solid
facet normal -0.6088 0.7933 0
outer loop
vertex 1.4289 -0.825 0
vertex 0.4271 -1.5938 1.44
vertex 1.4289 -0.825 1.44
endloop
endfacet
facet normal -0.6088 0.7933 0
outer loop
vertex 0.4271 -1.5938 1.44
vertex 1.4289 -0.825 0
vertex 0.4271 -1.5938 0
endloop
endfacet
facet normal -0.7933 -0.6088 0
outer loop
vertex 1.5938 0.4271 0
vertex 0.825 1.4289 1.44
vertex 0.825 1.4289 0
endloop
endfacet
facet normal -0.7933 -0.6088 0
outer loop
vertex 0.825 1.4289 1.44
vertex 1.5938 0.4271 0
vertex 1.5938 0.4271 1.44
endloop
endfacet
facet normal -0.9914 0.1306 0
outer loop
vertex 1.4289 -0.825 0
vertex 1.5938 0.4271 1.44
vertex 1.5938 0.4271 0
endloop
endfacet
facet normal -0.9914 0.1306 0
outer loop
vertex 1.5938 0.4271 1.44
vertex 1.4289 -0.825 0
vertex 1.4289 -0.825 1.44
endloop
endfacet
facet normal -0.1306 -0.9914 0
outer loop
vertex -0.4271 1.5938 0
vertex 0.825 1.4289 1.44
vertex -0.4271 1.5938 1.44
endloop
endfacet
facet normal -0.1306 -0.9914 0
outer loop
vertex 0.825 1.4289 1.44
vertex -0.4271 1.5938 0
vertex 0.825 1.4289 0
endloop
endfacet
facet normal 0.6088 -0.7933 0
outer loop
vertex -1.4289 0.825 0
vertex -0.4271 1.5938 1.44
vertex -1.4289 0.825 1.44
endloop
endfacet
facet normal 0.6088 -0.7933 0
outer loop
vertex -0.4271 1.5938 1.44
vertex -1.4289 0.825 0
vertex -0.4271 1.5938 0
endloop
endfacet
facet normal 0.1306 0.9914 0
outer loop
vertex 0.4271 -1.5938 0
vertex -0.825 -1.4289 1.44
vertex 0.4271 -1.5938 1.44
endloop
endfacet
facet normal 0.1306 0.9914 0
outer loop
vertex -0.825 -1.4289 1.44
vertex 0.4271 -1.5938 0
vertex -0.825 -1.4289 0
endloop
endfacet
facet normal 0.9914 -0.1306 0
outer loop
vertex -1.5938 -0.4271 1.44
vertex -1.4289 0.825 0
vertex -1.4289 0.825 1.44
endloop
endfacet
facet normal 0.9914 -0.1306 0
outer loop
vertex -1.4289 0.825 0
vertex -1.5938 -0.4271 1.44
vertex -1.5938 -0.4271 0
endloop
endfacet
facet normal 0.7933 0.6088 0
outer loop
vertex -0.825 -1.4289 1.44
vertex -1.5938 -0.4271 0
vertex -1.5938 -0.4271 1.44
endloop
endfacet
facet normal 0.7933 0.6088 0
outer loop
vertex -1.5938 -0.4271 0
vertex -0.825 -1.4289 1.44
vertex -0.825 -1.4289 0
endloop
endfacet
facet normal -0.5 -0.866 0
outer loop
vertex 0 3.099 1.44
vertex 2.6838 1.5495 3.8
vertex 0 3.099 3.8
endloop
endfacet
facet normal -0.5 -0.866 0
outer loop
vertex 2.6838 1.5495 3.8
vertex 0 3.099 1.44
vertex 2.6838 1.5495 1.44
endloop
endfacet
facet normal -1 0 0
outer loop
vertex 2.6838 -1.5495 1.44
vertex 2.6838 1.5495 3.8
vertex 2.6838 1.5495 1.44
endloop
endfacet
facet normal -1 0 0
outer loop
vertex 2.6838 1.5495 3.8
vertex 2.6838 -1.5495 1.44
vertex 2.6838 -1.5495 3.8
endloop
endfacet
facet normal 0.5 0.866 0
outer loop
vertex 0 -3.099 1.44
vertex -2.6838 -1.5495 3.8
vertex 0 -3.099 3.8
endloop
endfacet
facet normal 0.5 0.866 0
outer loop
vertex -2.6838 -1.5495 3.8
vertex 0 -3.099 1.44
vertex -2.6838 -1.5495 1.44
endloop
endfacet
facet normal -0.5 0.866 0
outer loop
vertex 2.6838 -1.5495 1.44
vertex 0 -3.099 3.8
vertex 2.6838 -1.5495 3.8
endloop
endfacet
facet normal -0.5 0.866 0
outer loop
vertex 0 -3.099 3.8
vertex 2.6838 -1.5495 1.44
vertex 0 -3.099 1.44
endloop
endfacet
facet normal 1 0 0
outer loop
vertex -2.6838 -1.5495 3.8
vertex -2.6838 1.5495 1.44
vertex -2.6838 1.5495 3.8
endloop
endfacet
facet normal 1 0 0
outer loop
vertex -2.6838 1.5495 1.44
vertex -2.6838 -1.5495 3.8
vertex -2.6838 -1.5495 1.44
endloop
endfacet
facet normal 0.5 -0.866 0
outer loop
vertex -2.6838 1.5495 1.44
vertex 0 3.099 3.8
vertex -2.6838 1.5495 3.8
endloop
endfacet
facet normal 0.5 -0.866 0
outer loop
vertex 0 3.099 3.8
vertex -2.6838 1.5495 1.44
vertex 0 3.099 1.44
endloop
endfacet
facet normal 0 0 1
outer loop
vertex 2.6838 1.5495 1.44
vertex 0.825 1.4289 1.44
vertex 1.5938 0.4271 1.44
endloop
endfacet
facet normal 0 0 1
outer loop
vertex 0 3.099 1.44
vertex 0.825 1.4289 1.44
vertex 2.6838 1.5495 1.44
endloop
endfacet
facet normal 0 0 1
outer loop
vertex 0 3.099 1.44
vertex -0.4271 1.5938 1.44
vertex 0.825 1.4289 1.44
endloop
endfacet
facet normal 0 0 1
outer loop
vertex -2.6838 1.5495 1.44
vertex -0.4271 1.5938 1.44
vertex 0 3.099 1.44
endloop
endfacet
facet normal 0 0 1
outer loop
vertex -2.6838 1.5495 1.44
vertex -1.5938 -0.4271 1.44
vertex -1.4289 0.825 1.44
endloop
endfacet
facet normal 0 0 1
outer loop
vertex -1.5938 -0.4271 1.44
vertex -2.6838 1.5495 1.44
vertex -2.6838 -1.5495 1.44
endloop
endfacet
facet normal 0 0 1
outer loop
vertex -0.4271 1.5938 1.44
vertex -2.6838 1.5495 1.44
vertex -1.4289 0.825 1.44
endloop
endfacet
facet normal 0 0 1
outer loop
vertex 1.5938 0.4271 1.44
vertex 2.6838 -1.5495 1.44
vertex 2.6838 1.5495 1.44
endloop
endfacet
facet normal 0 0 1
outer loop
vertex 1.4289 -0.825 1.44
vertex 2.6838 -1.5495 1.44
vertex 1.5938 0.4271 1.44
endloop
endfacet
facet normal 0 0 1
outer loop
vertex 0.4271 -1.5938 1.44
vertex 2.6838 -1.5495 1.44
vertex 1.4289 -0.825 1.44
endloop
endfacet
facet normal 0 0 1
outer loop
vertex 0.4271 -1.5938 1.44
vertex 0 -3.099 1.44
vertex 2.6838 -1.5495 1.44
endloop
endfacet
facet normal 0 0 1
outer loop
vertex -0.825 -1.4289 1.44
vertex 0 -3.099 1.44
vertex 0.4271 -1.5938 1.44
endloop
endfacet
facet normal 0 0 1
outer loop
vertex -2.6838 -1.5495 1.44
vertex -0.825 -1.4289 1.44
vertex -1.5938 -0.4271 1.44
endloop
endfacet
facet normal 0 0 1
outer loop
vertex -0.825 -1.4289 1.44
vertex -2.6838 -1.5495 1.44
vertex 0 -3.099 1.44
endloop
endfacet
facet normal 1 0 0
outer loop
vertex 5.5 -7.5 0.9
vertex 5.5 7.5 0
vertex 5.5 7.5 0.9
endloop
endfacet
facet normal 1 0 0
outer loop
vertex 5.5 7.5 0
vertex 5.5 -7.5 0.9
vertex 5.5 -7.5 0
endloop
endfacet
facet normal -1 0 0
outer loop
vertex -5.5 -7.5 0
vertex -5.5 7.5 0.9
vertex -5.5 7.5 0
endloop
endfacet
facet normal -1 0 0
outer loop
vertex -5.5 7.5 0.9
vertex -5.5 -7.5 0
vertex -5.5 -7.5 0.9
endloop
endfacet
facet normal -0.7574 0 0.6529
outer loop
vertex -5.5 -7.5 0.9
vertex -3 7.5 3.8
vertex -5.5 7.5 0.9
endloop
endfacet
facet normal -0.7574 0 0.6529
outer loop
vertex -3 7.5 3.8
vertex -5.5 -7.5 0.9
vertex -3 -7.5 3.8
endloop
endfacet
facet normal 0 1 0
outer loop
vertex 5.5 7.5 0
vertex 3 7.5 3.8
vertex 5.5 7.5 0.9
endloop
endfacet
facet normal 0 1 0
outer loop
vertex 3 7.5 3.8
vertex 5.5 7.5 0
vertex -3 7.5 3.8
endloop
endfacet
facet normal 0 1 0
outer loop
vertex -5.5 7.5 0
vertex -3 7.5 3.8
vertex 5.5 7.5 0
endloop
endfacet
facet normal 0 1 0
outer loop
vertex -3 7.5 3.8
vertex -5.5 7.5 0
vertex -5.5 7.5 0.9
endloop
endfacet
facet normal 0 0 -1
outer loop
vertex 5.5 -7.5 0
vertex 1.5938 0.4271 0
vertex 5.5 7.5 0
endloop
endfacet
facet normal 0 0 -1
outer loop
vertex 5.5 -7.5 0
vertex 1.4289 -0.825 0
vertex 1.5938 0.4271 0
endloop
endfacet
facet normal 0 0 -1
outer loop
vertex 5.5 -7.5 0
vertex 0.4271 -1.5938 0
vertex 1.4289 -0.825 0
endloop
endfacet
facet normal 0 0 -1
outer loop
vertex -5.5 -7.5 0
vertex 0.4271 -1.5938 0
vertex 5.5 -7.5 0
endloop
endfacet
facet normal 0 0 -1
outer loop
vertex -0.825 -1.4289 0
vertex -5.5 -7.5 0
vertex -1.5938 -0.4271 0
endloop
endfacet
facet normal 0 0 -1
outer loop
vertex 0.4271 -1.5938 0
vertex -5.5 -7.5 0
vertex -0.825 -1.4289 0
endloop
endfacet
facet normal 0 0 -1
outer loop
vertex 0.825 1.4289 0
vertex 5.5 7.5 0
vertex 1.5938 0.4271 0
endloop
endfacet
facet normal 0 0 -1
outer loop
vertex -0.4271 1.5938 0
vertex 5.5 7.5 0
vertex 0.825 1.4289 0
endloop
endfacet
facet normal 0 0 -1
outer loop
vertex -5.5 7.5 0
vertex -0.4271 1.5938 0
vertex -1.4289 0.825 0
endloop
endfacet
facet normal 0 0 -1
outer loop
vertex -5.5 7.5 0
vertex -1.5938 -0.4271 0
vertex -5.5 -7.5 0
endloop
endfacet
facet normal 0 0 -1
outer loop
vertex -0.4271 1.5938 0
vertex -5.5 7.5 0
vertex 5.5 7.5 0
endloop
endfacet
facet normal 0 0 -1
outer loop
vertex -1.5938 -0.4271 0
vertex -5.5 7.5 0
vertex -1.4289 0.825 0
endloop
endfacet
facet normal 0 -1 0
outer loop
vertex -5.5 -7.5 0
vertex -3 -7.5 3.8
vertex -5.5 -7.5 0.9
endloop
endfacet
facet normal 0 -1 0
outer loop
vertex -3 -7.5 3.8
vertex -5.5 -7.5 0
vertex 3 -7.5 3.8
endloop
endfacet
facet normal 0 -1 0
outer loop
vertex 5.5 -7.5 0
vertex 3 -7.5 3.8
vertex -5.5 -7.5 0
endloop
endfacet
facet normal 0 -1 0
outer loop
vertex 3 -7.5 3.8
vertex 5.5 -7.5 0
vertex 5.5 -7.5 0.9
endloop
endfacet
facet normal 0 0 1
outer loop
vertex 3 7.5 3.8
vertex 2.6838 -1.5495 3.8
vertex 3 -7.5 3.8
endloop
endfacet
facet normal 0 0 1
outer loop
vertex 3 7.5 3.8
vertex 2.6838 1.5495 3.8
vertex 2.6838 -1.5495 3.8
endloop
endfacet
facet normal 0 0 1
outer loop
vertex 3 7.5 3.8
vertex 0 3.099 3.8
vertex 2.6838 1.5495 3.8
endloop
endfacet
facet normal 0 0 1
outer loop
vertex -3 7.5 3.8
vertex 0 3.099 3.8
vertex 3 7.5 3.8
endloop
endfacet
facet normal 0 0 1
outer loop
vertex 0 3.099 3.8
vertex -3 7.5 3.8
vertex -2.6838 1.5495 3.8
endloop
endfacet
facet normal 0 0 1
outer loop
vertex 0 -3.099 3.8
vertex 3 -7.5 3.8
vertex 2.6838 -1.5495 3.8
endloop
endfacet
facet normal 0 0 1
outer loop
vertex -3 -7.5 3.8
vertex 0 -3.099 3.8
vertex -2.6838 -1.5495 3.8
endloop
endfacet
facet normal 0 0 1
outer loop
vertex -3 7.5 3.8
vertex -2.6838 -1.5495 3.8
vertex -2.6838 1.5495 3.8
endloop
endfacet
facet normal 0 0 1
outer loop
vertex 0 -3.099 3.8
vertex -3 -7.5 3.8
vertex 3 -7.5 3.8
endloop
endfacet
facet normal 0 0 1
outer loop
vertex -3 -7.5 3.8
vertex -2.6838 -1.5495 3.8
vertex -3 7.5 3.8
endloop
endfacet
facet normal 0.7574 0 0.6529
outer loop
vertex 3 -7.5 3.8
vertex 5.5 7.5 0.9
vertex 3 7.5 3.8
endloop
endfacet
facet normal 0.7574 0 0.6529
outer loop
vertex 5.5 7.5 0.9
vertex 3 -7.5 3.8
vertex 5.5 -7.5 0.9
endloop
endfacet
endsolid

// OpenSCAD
// file: beam.scad
// Misumi Beam
module misumibeam(size1=15, size2=15, length=100, extra=0.1) {
   difference() {
      cube([size1+extra, size2+extra, length], center=true);
      for (a = [0:180:180]) rotate([0, 0, a]) {
         translate([size1/2, 0, 0]) {
          //  % cube([size1/2, 3, length+1], center=true);
			minkowski() {
               cube([size1/2-(extra+1), size1/6-extra, length+1], center=true);
               cylinder(r=0.5, h=1, center=true);
			} 
        }
      }
      for (a = [0:90:270]) rotate([0, 0, a]) {
         translate([size2/2, 0, 0]) {
          //  % cube([size1/2, 3, length+1], center=true);
			minkowski() {
               cube([size1/2-(extra+1), size1/6-extra, length+1], center=true);
               cylinder(r=0.5, h=1, center=true);
			} 
        }
      }
   }
}

# misumibeam(15, 15, 300);
// file: nema17.scad
include <configuration.scad>;

// NEMA17 stepper motor

module stepper_motor(length=47.5, shaft_radius=5.00/2) {
   intersection() {
      cube([42.2, length, 42.2], center=true);
      rotate([90, 0, 0])
      cylinder(r=25.5, h=length+1, center=true);
   }
   translate([0, -length/2, 0]) {
// drive shaft
		rotate([90, 0, 0]) {
		 cylinder(r1=11, r2=11, h=2, $fn=40);
		 cylinder(r=shaft_radius, h=25);
		}
// mounting bolts
      for (a = [0:90:360]) rotate([0, a, 0]) {
         translate([15.5, 0, 15.5]) rotate([90, 0, 0])
         cylinder(r=m3_major_radius, h=10,  $fn=30);
      }
   }
}

module stepper_motor_boolean(length=47.5, shaft_radius=7.00/2) {
   intersection() {
      cube([42.2, length, 42.2], center=true);
      rotate([90, 0, 0])
      cylinder(r=25.5, h=length+1, center=true);
   }
   translate([0, -length/2, 0]) {
// drive shaft
		rotate([90, 0, 0]) {
		 cylinder(r1=12+extra_boolean, r2=11+extra_boolean, h=2, $fn=40);
		 cylinder(r=shaft_radius, h=25, $fn=8);
		}
// mounting bolts
      for (a = [0:90:360]) rotate([0, a, 0]) {
         translate([15.5, 0, 15.5]) rotate([90, 0, 0])
         cylinder(r=m3_major_radius+extra_radius, h=10,  $fn=8);
      }
   }
}

//# stepper_motor();
# stepper_motor_boolean();
// file: metric_fastners.scad
/*
 *  OpenSCAD Metric Fastners Library (www.openscad.org)
 *  Copyright (C) 2010-2011  Giles Bathgate
 *
 *  This program is free software; you can redistribute it and/or modify
 *  it under the terms of the GNU General Public License as published by
 *  the Free Software Foundation; either version 3 of the License,
 *  LGPL version 2.1, or (at your option) any later version of the GPL.
 *
 *  This program is distributed in the hope that it will be useful,
 *  but WITHOUT ANY WARRANTY; without even the implied warranty of
 *  MERCHANTABILITY or FITNESS FOR A PARTICULAR PURPOSE.  See the
 *  GNU General Public License for more details.
 *
 *  You should have received a copy of the GNU General Public License
 *  along with this program; if not, write to the Free Software
 *  Foundation, Inc., 59 Temple Place, Suite 330, Boston, MA 02111-1307 USA
 *
*/

$fn=50;
apply_chamfer=false;

// M3 Mesurements
m3_minor_radius = 2.50/2;
m3_major_radius = 3.00/2;
m3_head_radius = 5.50/2;
m3_nut_radius = 6.20/2;

// M4 Mesurements
m4_minor_radius = 3.30/2;
m4_major_radius = 4.00/2;
m4_head_radius = 7.00/2;
m4_nut_radius = 8.26/2;

// M5 Mesurements
m5_minor_radius = 4.20/2;
m5_major_radius = 5.00/2;
m5_head_radius = 8.50/2;
m5_nut_radius = 10.33/2;

// M6 Mesurements
m6_minor_radius = 5.00/2;
m6_major_radius = 6.00/2;
m6_head_radius = 10.00/2;
m6_nut_radius = 12.40/2;


module cap_bolt(dia,len)
{
	e=1.5*dia;
	h1=1.25*dia;
	cylinder(r=dia/2,h=len);
	translate([0,0,-h1]) cylinder(r=e/2,h=h1);
}

module cap_bolt_boolean(dia,len,fn=8)
{
	e=1.87*dia;
	h1=2*dia;
	cylinder(r=dia/2,h=len,$fn=fn);
	translate([0,0,-h1+0.05]) cylinder(r2=e/2+0.15,r1=e/2+0.3,h=h1,$fn=fn);
}

module csk_bolt(dia,len)
{
	h1=0.6*dia;
	h2=len-h1;
	cylinder(r=dia/2,h=h2);
	cylinder(r1=dia,r2=dia/2,h=h1);
}

module washer(dia)
{
	t=0.1*dia;
	difference()
	{
		cylinder(r=dia,h=t);
		translate([0,0,-t/2])cylinder(r=dia/2,h=t*2);
	}
}

module flat_nut(dia)
{
	m=0.8*dia;
	e=2.066*dia;
	c=0.2*dia;
	difference()
	{
		cylinder(r=e/2,h=m,$fn=6);
		translate([0,0,-m/2])cylinder(r=dia/2,h=m*2);
		if(apply_chamfer)
		    translate([0,0,c])cylinder_chamfer(e/2,c);
	}
}

module flat_nut_boolean(dia)
{
	m=0.8*dia;
	e=2.066*dia;
	c=0.2*dia;
	difference()
	{
		cylinder(r=e/2,h=m,$fn=6);
		if(apply_chamfer)
		    translate([0,0,c])cylinder_chamfer(e/2,c);
	}
}

module bolt(dia,len)
{
	e=1.8*dia;
	k=0.7*dia;
	c=0.2*dia;
	difference()
	{
		cylinder(r=e/2,h=k,$fn=6);
		if(apply_chamfer)
		    translate([0,0,c])cylinder_chamfer(e/2,c);
	}

	cylinder(r=dia/2,h=len);

}

module cylinder_chamfer(r1,r2)
{
	t=r1-r2;
	p=r2*2;
	rotate_extrude()
	difference()
	{
		translate([t,-p])square([p,p]);
		translate([t,0])circle(r2);
	}
}

module chamfer(len,r)
{
	p=r*2;
	linear_extrude(height=len)
	difference()
	{
		square([p,p]);
		circle(r);
	}
}

union()
{
//cap_bolt(3,15);
//cap_bolt_boolean(3,15,30);
//csk_bolt(3,14);
//washer(3);
//flat_nut_boolean(3);
//bolt(4,14);
//cylinder_chamfer(8,1);
//chamfer(10,2);
}
// file: configuration.scad
// Delta-Six 3D Printer 
// Created by Sage Merrill
// Released on Openbuilds.com
// Based on orginal design by Johann C. Rocholl (Kossel Printer)
// License = Attribution Share Alike - CC BY SA


include <metric_fastners.scad>;
use <nema17.scad>;
use <beam.scad>;
use <timing_belts.scad>;

$fn=20;

// Increase this if your slicer or printer makes the holes too small.
extra_radius = 0.10;
extra_boolean = 0.15;

// Delta Parameters
global_delta_arm_seperation = 55;
global_effector_bore_radius = 21;
global_mounting_hole_radius = 27;

// M5 Hardware
m5_bolt = m5_major_radius*2;
m5_bolt_boolean = m5_bolt+extra_radius;

// M3 Hardware
m3_bolt = m3_major_radius*2;
m3_bolt_boolean = m3_bolt+extra_radius;

// NEMA17 stepper motor
motor_length = 47.5;
motor_shaft_radius= 5.00/2;
// main file
// Delta-Six 3D Printer 
// Created by Sage Merrill
// Released on Openbuilds.com
// Based on orginal design by Johann C. Rocholl (Kossel Printer)
// License = Attribution Share Alike - CC BY SA

include <configuration.scad>;

size = 3;

module t_nut(size=size) { rotate([180,0,0]) 
	difference() {
	 translate([-6, -7.5, 0]) rotate([270,0,0])
		 linear_extrude(height=15)
		 polygon([ [0.5,0], [11.5, 0], [11.5, 0.9], [9.0, 3.8], [3, 3.8], [0.5, 0.9] ]);

#	translate([0, 0, 10]) rotate([180, 0, 30])
	 cap_bolt_boolean(size+.3, 20);

#	translate([0, 0, -size*1.28]) rotate([0, 0, 30])
	 flat_nut(size);

	}

}



// Primary Placement
translate([0, 0, 0]) rotate([0, 0, 0])
 t_nut();


module beam(length=40) {
	linear_extrude(length)
	 polygon([ [-4.5, 0], [-2.7, -1.9], [-5.5,-1.9], [-5.5, -2.8], [-3, -5.7], [3, -5.7], [5.5, -2.8], [5.5,-1.9], [2.7, -1.9], [4.5, 0], [2.7, 1.9], [5.5, 1.9], [5.5, 2.8], [3, 5.7], [-3, 5.7], [-5.5, 2.8], [-5.5,1.9], [-2.7, 1.9] ]);
}
